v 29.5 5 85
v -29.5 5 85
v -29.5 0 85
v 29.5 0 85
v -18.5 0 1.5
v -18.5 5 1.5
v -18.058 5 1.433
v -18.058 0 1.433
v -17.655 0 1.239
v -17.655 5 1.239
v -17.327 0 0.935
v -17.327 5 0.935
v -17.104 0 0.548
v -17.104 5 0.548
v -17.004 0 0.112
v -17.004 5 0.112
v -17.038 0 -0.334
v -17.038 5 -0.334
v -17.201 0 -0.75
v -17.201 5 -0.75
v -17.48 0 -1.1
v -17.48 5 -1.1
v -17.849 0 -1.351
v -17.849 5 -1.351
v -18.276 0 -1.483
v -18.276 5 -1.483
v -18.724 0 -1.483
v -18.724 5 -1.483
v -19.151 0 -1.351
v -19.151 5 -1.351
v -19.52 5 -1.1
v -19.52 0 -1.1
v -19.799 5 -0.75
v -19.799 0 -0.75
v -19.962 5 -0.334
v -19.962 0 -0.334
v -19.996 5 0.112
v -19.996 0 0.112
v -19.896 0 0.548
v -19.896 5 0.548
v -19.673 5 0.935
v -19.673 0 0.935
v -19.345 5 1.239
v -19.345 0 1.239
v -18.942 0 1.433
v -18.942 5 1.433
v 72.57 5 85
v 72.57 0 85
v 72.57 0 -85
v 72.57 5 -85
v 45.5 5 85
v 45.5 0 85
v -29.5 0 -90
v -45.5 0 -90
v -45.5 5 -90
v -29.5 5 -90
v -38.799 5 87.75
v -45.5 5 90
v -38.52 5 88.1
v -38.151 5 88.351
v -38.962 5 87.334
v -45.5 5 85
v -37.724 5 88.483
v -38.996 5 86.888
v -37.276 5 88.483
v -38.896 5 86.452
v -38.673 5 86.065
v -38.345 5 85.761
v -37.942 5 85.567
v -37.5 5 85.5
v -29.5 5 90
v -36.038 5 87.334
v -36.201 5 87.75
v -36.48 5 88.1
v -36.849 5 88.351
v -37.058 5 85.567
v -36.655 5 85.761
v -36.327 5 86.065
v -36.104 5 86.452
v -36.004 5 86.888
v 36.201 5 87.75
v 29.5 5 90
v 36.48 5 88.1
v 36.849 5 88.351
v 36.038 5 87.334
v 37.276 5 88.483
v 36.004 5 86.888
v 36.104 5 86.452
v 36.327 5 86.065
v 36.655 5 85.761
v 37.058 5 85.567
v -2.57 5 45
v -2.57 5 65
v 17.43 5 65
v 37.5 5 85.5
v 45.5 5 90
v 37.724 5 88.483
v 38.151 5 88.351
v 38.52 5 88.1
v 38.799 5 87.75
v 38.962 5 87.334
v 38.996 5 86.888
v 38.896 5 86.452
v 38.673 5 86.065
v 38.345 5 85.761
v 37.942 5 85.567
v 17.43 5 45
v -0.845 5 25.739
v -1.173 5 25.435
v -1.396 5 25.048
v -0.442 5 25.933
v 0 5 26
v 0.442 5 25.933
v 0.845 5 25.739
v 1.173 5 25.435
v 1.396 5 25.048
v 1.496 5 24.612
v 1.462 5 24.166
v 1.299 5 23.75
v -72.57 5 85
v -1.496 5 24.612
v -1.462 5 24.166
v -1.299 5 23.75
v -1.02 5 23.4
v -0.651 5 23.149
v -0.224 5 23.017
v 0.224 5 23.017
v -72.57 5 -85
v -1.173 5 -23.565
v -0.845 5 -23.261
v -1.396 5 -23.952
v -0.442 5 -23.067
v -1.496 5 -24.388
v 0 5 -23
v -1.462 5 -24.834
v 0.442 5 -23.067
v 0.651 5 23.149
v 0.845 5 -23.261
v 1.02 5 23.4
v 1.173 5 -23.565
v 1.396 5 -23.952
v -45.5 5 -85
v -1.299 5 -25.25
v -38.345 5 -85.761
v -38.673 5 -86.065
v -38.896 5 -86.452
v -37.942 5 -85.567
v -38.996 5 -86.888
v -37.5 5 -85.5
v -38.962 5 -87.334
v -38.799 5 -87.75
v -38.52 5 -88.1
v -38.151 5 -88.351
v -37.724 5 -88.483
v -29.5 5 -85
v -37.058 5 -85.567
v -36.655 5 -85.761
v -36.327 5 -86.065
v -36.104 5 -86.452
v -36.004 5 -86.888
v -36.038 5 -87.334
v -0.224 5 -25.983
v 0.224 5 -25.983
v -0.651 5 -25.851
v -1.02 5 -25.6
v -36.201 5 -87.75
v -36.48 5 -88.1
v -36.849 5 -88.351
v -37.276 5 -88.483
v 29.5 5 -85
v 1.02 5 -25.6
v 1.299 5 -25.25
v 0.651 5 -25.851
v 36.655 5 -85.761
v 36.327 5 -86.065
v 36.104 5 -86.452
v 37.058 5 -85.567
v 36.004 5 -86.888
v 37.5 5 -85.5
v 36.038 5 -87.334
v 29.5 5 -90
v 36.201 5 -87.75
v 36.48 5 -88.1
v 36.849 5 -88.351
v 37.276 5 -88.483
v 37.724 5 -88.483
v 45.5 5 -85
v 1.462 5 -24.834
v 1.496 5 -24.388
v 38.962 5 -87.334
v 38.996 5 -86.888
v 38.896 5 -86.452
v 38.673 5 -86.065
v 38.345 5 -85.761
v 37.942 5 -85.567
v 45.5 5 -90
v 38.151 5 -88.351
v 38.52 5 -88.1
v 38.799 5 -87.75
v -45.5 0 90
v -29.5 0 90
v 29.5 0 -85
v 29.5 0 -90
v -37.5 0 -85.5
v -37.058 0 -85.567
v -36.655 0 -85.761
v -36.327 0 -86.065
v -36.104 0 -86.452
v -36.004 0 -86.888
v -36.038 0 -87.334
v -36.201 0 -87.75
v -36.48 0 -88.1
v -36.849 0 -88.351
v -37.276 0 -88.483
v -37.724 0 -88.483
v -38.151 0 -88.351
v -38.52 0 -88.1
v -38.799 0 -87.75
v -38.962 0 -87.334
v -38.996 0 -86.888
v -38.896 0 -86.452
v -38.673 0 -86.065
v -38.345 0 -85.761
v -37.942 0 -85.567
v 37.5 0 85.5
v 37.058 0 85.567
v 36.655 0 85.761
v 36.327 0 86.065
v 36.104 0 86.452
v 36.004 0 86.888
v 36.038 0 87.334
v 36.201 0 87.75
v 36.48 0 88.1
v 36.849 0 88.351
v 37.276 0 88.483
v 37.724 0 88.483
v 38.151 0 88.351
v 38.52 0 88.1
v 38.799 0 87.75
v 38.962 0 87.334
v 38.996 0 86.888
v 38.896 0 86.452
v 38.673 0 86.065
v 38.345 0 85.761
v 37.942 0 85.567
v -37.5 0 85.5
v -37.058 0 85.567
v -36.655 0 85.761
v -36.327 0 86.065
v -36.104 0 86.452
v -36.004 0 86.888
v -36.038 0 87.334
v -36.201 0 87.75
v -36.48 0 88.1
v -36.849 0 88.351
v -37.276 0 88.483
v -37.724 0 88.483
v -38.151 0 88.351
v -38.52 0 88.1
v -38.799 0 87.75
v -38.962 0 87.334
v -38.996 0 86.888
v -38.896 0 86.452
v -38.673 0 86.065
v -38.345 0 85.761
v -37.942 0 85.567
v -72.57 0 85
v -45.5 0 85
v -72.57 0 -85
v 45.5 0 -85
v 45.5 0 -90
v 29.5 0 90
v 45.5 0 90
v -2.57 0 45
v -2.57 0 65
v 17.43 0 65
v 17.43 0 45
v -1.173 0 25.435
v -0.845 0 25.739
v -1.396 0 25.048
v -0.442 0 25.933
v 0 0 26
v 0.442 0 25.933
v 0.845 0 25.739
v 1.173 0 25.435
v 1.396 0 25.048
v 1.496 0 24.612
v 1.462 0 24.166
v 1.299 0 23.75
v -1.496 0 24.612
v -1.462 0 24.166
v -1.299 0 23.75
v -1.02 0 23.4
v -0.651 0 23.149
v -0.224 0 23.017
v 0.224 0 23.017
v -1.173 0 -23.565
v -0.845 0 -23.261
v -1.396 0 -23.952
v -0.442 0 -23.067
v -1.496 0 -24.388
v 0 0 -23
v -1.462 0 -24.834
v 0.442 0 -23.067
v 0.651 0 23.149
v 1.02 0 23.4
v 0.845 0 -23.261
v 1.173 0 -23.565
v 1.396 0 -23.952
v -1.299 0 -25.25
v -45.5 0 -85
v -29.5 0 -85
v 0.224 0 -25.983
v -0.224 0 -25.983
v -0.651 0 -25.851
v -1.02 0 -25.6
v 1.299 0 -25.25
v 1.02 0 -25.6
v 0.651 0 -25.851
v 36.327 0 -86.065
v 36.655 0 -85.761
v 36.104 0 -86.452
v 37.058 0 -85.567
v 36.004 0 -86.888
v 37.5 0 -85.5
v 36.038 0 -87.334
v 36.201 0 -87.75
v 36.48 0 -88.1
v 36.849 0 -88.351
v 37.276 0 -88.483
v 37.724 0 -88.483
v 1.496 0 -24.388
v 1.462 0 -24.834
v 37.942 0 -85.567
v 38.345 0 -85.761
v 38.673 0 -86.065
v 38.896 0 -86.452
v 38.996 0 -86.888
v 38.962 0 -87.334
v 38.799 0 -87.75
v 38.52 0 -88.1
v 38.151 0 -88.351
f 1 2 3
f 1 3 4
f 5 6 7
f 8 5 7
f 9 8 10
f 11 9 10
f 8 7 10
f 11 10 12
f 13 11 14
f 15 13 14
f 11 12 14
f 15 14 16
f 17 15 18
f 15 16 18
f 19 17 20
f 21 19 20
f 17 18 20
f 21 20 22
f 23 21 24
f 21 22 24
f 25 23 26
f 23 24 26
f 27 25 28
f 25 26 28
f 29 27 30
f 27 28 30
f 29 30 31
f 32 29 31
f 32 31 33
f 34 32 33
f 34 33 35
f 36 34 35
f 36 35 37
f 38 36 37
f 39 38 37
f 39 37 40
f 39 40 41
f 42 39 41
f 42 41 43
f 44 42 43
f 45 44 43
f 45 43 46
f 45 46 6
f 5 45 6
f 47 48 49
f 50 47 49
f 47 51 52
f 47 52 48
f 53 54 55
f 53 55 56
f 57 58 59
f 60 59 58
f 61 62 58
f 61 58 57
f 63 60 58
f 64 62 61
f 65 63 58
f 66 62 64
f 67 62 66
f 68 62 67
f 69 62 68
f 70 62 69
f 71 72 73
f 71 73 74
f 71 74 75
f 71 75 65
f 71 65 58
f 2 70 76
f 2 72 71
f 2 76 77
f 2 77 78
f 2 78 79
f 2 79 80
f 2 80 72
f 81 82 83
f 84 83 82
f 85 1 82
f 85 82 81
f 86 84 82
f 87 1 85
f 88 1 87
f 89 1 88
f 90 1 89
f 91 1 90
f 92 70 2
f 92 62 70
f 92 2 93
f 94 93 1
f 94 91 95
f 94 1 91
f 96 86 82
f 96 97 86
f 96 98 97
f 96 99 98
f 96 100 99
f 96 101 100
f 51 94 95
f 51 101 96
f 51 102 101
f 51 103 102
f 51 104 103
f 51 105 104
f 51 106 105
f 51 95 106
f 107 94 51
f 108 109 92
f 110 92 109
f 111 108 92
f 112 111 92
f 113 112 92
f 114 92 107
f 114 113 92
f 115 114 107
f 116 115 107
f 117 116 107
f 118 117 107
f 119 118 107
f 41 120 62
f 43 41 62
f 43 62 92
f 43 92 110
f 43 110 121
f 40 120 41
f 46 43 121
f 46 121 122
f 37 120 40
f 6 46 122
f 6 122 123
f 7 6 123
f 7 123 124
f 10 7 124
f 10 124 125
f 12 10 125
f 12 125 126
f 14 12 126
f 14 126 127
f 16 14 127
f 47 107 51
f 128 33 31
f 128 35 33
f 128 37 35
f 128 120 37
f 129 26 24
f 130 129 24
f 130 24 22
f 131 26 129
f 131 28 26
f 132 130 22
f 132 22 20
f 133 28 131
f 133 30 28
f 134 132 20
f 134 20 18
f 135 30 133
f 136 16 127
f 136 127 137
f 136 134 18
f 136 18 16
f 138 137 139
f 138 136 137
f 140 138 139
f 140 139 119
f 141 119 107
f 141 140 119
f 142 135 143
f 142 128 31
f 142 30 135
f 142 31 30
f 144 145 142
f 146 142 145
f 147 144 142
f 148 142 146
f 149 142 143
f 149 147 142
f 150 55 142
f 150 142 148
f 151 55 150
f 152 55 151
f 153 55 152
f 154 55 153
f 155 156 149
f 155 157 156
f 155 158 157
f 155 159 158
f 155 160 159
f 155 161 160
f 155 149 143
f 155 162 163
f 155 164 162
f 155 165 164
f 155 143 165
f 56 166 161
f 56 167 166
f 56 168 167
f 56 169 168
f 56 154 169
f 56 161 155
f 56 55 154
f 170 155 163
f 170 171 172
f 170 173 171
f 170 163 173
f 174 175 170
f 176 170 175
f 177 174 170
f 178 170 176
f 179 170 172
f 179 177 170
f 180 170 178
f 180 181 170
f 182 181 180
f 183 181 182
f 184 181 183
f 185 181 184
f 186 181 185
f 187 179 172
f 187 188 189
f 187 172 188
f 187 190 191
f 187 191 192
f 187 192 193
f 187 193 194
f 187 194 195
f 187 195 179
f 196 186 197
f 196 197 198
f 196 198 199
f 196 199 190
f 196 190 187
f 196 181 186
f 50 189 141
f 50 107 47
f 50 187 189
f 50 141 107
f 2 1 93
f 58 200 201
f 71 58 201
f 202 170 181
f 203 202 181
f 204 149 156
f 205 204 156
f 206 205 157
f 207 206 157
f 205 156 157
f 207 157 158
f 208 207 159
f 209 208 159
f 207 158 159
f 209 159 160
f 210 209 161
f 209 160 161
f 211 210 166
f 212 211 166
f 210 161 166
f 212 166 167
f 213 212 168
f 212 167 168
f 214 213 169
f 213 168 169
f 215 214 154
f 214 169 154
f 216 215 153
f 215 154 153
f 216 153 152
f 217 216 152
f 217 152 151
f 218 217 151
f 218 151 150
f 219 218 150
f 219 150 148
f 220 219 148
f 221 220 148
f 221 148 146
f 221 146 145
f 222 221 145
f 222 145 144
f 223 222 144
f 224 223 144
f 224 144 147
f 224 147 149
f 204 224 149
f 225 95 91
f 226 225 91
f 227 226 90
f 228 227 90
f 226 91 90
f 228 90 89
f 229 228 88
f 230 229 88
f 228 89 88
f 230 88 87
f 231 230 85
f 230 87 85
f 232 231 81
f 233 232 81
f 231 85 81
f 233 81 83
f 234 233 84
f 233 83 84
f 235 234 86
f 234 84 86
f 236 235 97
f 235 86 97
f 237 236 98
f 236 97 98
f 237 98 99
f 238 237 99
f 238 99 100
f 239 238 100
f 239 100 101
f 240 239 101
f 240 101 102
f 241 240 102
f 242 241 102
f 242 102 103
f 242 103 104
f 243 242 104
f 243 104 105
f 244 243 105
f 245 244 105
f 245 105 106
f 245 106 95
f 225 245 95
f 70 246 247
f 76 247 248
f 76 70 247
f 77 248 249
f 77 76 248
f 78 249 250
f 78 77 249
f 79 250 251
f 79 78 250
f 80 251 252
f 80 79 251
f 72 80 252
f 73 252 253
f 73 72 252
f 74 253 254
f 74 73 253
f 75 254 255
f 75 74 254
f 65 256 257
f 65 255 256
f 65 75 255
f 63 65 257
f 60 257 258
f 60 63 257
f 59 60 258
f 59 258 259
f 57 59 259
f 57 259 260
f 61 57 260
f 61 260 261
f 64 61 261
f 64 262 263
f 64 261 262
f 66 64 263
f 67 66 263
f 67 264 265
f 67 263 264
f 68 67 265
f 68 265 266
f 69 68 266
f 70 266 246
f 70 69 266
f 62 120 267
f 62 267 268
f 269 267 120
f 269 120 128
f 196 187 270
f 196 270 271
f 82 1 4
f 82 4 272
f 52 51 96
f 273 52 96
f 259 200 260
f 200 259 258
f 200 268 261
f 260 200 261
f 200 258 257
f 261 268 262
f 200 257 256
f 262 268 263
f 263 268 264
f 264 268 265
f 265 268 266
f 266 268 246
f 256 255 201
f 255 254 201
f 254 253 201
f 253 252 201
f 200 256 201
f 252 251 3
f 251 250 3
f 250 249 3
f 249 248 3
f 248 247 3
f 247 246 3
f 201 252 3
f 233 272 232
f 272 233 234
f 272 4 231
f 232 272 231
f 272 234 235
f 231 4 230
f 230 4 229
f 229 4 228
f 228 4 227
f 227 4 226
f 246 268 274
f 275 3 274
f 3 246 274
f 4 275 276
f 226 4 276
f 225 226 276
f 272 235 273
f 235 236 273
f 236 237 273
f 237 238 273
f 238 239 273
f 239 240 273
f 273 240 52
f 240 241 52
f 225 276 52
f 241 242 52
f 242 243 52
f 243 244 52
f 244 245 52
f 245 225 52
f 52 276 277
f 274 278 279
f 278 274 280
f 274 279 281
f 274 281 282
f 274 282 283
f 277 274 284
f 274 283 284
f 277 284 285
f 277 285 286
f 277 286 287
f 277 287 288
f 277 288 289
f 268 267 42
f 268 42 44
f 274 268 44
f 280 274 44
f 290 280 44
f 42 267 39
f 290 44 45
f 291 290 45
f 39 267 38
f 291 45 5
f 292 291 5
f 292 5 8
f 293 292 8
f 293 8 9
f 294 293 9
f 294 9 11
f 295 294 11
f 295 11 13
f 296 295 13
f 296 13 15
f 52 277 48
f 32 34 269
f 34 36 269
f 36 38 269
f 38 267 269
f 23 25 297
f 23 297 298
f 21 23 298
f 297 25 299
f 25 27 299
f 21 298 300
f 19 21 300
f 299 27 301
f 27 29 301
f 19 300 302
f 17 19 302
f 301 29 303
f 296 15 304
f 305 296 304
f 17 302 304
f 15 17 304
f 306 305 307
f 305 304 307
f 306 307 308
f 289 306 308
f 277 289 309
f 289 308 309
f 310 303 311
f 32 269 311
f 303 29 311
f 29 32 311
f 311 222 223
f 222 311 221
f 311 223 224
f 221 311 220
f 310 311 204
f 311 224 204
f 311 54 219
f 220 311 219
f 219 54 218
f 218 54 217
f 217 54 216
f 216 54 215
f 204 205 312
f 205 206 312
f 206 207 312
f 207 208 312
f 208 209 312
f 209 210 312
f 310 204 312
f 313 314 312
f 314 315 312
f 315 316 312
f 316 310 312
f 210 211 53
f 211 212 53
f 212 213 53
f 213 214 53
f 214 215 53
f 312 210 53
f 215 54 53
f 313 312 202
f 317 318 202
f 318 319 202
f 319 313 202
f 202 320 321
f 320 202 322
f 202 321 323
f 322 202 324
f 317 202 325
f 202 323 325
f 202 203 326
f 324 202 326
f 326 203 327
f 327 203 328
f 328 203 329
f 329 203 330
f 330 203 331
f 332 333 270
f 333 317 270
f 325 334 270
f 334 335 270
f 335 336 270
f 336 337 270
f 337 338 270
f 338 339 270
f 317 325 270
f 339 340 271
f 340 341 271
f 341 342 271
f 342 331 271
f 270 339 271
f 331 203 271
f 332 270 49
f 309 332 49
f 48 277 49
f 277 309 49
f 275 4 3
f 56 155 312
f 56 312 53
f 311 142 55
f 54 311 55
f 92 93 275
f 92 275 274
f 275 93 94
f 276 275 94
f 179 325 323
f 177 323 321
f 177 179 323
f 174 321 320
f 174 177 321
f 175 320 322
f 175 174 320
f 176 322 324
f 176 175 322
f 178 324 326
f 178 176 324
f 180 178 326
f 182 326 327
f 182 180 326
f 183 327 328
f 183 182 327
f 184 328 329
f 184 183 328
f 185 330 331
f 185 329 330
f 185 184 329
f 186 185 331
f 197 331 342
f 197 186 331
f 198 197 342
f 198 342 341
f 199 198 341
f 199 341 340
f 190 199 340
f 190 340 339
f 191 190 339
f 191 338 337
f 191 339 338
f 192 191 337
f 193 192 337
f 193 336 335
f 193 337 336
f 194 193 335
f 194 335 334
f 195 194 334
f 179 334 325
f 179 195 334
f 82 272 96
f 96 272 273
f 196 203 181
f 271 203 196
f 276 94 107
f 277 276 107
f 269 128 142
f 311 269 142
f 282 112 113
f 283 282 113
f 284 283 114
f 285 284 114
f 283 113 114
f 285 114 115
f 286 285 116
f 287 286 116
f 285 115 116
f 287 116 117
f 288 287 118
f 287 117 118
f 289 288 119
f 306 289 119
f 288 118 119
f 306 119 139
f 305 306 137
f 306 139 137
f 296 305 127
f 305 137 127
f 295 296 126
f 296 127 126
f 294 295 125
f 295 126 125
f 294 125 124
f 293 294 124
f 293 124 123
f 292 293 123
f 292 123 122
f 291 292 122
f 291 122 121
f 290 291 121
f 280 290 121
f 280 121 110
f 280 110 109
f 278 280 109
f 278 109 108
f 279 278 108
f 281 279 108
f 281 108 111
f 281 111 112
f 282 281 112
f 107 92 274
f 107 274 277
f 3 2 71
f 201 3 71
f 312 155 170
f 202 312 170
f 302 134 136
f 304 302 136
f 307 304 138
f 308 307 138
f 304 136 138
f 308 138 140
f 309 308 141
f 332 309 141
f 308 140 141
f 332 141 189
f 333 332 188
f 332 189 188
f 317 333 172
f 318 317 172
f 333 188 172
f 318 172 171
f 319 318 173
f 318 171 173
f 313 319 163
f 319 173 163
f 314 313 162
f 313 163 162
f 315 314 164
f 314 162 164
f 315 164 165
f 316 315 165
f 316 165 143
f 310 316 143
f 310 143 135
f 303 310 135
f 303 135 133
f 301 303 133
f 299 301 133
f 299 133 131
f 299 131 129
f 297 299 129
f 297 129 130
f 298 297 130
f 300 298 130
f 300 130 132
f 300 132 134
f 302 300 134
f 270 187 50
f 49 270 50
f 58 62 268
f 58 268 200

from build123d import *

# Parameters (mm, degrees)
CROQUIS1_W                = 145.14
CROQUIS1_H                = 180
SALIENTE_EXTRUIR1_DEPTH   = 5
CROQUIS2_W                = 59
CROQUIS2_H                = 5
CROQUIS2_W_2              = 27.07
CORTAR_EXTRUIR1_DEPTH     = 116.721237895
CROQUIS3_R                = 1.5
CORTAR_EXTRUIR2_DEPTH     = 116.721237895
SIMETR_A3_COPY_1_SKETCH_R = 1.5
SIMETR_A3_COPY_1_DEPTH    = 116.721237895
CROQUIS4_R                = 1.5
CORTAR_EXTRUIR3_DEPTH     = 116.721237895
CROQUIS5_W                = 20
CROQUIS5_H                = 20
CORTAR_EXTRUIR4_DEPTH     = 116.721237895


with BuildPart() as part:
    # Croquis1 → Saliente-Extruir1 (new body)
    with BuildSketch(Plane(origin=(0, 0, 0), x_dir=(1, 0, 0), z_dir=(0, 1, 0))):
        Rectangle(CROQUIS1_W, CROQUIS1_H)
    extrude(amount=SALIENTE_EXTRUIR1_DEPTH)

    # Croquis2 → Cortar-Extruir1 (cut, through all)
    with BuildSketch(Plane(origin=(0, 5, 0), x_dir=(1, 0, 0), z_dir=(0, 1, 0))):
        with Locations((0, 87.5)):
            Rectangle(CROQUIS2_W, CROQUIS2_H)
        with Locations((-59.035, 87.5)):
            Rectangle(CROQUIS2_W_2, CROQUIS2_H)
        with Locations((59.035, 87.5)):
            Rectangle(CROQUIS2_W_2, CROQUIS2_H)
    cortar_extruir1 = extrude(amount=-CORTAR_EXTRUIR1_DEPTH, mode=Mode.SUBTRACT)

    # Simetría1: Cortar-Extruir1 across plane
    add(cortar_extruir1.mirror(Plane.XY), mode=Mode.SUBTRACT)

    # Croquis3 → Cortar-Extruir2 (cut, through all)
    with BuildSketch(Plane(origin=(0, 5, 0), x_dir=(1, 0, 0), z_dir=(0, 1, 0))):
        with Locations(Location((-37.5, 87, 0), (0, 0, 270))):
            Circle(CROQUIS3_R)
    cortar_extruir2 = extrude(amount=-CORTAR_EXTRUIR2_DEPTH, mode=Mode.SUBTRACT)

    # Simetría2: Cortar-Extruir2 across plane
    add(cortar_extruir2.mirror(Plane(origin=(0, 0, 0), x_dir=(0, 0, 1), z_dir=(1, 0, 0))), mode=Mode.SUBTRACT)

    # Simetría3: Cortar-Extruir2 across plane
    add(cortar_extruir2.mirror(Plane.XY), mode=Mode.SUBTRACT)

    # Simetría3 copy 1 sketch → Simetría3 copy 1 (cut, through all)
    with BuildSketch(Plane(origin=(0, 5, 0), x_dir=(-1, 0, 0), z_dir=(0, 1, 0))):
        with Locations(Location((-37.5, 87, 0), (0, 0, 270))):
            Circle(SIMETR_A3_COPY_1_SKETCH_R)
    extrude(amount=-SIMETR_A3_COPY_1_DEPTH, mode=Mode.SUBTRACT)

    # Croquis4 → Cortar-Extruir3 (cut, through all)
    with BuildSketch(Plane(origin=(0, 5, 0), x_dir=(1, 0, 0), z_dir=(0, 1, 0))):
        with Locations(Location((0, 24.5, 0), (0, 0, 270))):
            Circle(CROQUIS4_R)
        with Locations(Location((0, -24.5, 0), (0, 0, 270))):
            Circle(CROQUIS4_R)
        with Locations(Location((-18.5, 0, 0), (0, 0, 270))):
            Circle(CROQUIS4_R)
    extrude(amount=-CORTAR_EXTRUIR3_DEPTH, mode=Mode.SUBTRACT)

    # Croquis5 → Cortar-Extruir4 (cut, through all)
    with BuildSketch(Plane(origin=(0, 5, 0), x_dir=(1, 0, 0), z_dir=(0, 1, 0))):
        with Locations((7.43, -55)):
            Rectangle(CROQUIS5_W, CROQUIS5_H)
    extrude(amount=-CORTAR_EXTRUIR4_DEPTH, mode=Mode.SUBTRACT)


solid = part.part
